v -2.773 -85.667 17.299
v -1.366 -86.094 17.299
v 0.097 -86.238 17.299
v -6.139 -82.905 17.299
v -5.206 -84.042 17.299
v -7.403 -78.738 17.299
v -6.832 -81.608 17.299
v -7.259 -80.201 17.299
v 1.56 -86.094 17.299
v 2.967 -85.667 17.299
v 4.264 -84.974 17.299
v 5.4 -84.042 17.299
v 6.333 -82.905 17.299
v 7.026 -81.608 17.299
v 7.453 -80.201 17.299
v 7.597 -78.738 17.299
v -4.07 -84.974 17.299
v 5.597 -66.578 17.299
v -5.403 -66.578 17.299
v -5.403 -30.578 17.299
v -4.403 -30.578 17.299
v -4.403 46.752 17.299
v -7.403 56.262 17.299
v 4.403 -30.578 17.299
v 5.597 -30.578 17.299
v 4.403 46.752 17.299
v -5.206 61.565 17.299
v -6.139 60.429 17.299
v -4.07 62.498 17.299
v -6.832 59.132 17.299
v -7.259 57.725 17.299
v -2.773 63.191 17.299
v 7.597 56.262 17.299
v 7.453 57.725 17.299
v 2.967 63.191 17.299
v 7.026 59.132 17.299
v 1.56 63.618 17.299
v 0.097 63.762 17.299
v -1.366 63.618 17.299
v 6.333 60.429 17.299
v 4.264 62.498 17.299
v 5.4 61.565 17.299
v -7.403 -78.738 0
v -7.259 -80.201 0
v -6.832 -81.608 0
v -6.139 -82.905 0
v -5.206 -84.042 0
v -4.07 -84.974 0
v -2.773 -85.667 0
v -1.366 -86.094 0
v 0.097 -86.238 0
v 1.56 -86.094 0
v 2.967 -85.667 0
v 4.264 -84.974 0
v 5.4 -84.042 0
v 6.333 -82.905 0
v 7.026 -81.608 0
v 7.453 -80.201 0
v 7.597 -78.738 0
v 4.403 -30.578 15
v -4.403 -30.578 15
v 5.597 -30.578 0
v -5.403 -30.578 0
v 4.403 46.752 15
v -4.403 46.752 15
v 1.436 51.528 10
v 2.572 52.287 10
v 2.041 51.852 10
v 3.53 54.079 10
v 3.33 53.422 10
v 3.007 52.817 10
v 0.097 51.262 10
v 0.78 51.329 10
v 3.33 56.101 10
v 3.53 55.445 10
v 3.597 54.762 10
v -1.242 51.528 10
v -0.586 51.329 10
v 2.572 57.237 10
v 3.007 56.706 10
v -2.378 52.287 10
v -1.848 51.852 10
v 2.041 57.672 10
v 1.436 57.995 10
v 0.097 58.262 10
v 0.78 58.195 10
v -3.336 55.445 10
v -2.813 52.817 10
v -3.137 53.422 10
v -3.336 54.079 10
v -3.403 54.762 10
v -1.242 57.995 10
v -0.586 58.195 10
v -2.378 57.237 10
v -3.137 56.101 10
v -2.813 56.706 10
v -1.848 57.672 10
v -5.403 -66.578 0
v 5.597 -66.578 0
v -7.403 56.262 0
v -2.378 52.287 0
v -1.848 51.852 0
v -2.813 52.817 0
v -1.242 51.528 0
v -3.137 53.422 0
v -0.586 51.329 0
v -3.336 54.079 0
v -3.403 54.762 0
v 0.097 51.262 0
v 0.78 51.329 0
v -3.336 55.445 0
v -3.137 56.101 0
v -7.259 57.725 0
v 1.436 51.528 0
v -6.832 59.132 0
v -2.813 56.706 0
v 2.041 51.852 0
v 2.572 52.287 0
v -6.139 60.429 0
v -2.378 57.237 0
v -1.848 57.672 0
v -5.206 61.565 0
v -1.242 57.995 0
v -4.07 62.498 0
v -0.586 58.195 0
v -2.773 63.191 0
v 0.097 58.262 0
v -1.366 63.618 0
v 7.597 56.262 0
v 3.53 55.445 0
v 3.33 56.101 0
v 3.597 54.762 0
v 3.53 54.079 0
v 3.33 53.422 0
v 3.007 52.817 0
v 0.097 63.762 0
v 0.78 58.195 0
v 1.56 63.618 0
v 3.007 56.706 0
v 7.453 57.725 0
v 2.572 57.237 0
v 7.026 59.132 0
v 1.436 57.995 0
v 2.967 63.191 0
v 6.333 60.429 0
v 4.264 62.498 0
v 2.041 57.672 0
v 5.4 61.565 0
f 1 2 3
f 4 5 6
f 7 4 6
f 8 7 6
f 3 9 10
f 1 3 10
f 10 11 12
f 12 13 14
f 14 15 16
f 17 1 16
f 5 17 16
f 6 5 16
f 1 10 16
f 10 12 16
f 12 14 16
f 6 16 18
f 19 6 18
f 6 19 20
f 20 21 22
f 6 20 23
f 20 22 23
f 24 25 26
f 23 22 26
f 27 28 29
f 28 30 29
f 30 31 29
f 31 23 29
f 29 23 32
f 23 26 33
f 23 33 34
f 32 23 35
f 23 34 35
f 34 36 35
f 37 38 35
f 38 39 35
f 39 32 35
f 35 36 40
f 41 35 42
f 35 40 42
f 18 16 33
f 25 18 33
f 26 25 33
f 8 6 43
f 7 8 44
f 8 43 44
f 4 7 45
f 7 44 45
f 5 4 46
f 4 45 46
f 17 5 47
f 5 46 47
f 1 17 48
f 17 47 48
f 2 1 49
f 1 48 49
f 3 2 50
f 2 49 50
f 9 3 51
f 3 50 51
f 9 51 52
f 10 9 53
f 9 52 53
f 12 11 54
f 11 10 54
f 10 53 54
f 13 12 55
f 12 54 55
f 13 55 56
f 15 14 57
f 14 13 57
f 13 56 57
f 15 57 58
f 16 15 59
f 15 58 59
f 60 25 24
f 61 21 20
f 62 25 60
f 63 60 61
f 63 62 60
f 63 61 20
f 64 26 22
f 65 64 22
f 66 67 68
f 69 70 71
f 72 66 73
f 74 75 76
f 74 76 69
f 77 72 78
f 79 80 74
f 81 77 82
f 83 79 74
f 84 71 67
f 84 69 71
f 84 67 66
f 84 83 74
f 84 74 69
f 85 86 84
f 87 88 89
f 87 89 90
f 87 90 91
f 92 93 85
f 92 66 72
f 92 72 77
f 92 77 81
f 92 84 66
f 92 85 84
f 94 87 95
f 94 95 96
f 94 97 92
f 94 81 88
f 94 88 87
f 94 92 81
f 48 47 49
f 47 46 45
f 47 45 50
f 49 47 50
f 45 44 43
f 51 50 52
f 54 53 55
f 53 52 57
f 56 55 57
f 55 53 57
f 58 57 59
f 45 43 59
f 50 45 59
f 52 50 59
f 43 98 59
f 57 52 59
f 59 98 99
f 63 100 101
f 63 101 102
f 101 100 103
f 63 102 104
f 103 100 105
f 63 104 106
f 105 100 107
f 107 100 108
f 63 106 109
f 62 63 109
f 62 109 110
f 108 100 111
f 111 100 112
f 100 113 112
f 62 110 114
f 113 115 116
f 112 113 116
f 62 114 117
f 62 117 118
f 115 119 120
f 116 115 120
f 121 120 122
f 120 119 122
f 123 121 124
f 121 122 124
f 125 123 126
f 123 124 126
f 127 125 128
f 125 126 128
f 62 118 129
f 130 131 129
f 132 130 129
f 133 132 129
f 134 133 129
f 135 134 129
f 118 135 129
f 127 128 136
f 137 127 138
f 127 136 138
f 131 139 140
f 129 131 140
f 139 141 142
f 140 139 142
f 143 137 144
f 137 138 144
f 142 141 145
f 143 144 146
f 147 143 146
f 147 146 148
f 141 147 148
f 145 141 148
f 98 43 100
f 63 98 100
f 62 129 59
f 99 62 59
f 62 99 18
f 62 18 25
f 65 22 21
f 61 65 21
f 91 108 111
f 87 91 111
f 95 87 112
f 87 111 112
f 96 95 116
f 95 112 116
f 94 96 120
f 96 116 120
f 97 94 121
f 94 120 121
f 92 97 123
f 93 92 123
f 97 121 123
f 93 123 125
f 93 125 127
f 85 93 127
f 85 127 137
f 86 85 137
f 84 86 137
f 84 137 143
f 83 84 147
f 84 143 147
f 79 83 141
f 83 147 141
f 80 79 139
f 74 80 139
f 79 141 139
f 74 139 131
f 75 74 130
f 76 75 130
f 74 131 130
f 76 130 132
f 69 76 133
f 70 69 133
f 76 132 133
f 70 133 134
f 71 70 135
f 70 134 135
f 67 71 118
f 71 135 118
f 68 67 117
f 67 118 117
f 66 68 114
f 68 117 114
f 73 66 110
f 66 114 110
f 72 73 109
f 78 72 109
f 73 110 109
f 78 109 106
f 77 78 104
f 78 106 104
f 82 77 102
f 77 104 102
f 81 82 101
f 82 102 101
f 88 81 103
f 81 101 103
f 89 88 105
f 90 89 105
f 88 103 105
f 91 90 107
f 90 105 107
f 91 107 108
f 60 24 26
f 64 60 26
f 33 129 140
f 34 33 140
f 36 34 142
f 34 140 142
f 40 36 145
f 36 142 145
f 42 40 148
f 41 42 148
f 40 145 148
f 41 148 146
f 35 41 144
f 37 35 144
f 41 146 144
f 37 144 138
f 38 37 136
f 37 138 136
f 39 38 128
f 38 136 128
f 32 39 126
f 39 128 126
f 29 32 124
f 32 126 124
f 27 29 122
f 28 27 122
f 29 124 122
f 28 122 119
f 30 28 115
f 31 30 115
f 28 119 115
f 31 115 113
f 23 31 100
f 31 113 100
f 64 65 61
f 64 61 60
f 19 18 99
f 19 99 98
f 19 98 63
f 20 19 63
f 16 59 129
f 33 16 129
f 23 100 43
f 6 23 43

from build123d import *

# Parameters (mm, degrees)
BOSS_EXTRUDE1_DEPTH = 135
SKETCH3_R           = 3.5
CUT_EXTRUDE2_DEPTH  = 10
SKETCH6_W           = 11
SKETCH6_H           = 36
CUT_EXTRUDE3_DEPTH  = 40
SKETCH7_W           = 55
SKETCH7_H           = 16.435142828
BOSS_EXTRUDE2_DEPTH = 35
CUT_EXTRUDE4_DEPTH  = 20
CUT_EXTRUDE5_DEPTH  = 20
SKETCH12_R          = 4.5
CUT_EXTRUDE6_DEPTH  = 20
CUT_EXTRUDE7_DEPTH  = 120
SKETCH14_W          = 10
SKETCH14_H          = 112.990035736
BOSS_EXTRUDE3_DEPTH = 9
SKETCH16_W          = 117.700647477
SKETCH16_H          = 151.246123551
CUT_EXTRUDE11_DEPTH = 166.309899973


with BuildPart() as part:
    # Sketch2 → Boss-Extrude1 (new body)
    with BuildSketch(Plane.XY):
        with BuildLine():
            Line((-7.403081865, 56.261800555), (-7.403081865, -78.738199445))
            ThreePointArc((-7.403081865, -78.738199445), (0.096918135, -86.238199445), (7.596918135, -78.738199445))
            Line((7.596918135, -78.738199445), (7.596918135, 56.261800555))
            ThreePointArc((7.596918135, 56.261800555), (0.096918135, 63.761800555), (-7.403081865, 56.261800555))
        make_face()
    extrude(amount=BOSS_EXTRUDE1_DEPTH)

    # Sketch3 → Cut-Extrude2 (cut)
    with BuildSketch(Plane(origin=(0, 0, 0), x_dir=(-1, 0, 0), z_dir=(0, 0, -1))):
        with Locations((-0.096918135, 54.761800555)):
            Circle(SKETCH3_R)
    extrude(amount=-CUT_EXTRUDE2_DEPTH, mode=Mode.SUBTRACT)

    # Sketch6 → Cut-Extrude3 (cut)
    with BuildSketch(Plane(origin=(0, 0, 0), x_dir=(-1, 0, 0), z_dir=(0, 0, -1))):
        with Locations((-0.096918135, -48.578199445)):
            Rectangle(SKETCH6_W, SKETCH6_H)
    extrude(amount=-CUT_EXTRUDE3_DEPTH, mode=Mode.SUBTRACT)

    # Sketch7 → Boss-Extrude2 (add)
    with BuildSketch(Plane.ZY.offset(7.403081865)):
        with Locations((67.5, -49.750557846)):
            Rectangle(SKETCH7_W, SKETCH7_H)
    extrude(amount=BOSS_EXTRUDE2_DEPTH)

    # Sketch10 → Cut-Extrude4 (cut)
    with BuildSketch(Plane(origin=(0, -41.532986432, 0), x_dir=(1, 0, 0), z_dir=(0, 1, 0))):
        with BuildLine():
            Line((-7.403081865, -40), (-42.403081865, -40))
            Line((-42.403081865, -40), (-42.403081865, -95))
            Line((-42.403081865, -95), (-7.403081865, -95))
            ThreePointArc((-7.403081865, -95), (-33.21161021, -67.5), (-7.403081865, -40))
        make_face()
    extrude(amount=-CUT_EXTRUDE4_DEPTH, mode=Mode.SUBTRACT)

    # Sketch11 → Cut-Extrude5 (cut)
    with BuildSketch(Plane(origin=(0, -41.532986432, 0), x_dir=(1, 0, 0), z_dir=(0, 1, 0))):
        with BuildLine():
            Line((-7.569996139, -52.041059143), (-7.569996139, -82.958940857))
            ThreePointArc((-7.569996139, -82.958940857), (-23.028936996, -67.5), (-7.569996139, -52.041059143))
        make_face()
    extrude(amount=-CUT_EXTRUDE5_DEPTH, mode=Mode.SUBTRACT)

    # Sketch12 → Cut-Extrude6 (cut)
    with BuildSketch(Plane.XY.offset(135)):
        with Locations((0.096918135, 54.761800555)):
            Circle(SKETCH12_R)
    extrude(amount=-CUT_EXTRUDE6_DEPTH, mode=Mode.SUBTRACT)

    # Sketch13 → Cut-Extrude7 (cut)
    with BuildSketch(Plane.XY.offset(135)):
        Polygon((4.403081865, 46.751836291), (-4.403081865, 46.751836291), (-4.403081865, -46.751836291), (-4.403081865, -66.238199445), (4.403081865, -66.238199445), (4.403081865, -46.751836291), align=None)
    extrude(amount=-CUT_EXTRUDE7_DEPTH, mode=Mode.SUBTRACT)

    # Sketch14 → Boss-Extrude3 (add)
    with BuildSketch(Plane.ZY.offset(-4.403081865)):
        with Locations((130, -9.743181577)):
            Rectangle(SKETCH14_W, SKETCH14_H)
    extrude(amount=BOSS_EXTRUDE3_DEPTH)

    # Sketch16 → Cut-Extrude11 (cut, through all)
    with BuildSketch(Plane(origin=(7.596918135, 0, 0), x_dir=(0, 0, -1), z_dir=(1, 0, 0))):
        with Locations((-76.149676262, -11.861261221)):
            Rectangle(SKETCH16_W, SKETCH16_H)
    extrude(amount=-CUT_EXTRUDE11_DEPTH, mode=Mode.SUBTRACT)


solid = part.part
